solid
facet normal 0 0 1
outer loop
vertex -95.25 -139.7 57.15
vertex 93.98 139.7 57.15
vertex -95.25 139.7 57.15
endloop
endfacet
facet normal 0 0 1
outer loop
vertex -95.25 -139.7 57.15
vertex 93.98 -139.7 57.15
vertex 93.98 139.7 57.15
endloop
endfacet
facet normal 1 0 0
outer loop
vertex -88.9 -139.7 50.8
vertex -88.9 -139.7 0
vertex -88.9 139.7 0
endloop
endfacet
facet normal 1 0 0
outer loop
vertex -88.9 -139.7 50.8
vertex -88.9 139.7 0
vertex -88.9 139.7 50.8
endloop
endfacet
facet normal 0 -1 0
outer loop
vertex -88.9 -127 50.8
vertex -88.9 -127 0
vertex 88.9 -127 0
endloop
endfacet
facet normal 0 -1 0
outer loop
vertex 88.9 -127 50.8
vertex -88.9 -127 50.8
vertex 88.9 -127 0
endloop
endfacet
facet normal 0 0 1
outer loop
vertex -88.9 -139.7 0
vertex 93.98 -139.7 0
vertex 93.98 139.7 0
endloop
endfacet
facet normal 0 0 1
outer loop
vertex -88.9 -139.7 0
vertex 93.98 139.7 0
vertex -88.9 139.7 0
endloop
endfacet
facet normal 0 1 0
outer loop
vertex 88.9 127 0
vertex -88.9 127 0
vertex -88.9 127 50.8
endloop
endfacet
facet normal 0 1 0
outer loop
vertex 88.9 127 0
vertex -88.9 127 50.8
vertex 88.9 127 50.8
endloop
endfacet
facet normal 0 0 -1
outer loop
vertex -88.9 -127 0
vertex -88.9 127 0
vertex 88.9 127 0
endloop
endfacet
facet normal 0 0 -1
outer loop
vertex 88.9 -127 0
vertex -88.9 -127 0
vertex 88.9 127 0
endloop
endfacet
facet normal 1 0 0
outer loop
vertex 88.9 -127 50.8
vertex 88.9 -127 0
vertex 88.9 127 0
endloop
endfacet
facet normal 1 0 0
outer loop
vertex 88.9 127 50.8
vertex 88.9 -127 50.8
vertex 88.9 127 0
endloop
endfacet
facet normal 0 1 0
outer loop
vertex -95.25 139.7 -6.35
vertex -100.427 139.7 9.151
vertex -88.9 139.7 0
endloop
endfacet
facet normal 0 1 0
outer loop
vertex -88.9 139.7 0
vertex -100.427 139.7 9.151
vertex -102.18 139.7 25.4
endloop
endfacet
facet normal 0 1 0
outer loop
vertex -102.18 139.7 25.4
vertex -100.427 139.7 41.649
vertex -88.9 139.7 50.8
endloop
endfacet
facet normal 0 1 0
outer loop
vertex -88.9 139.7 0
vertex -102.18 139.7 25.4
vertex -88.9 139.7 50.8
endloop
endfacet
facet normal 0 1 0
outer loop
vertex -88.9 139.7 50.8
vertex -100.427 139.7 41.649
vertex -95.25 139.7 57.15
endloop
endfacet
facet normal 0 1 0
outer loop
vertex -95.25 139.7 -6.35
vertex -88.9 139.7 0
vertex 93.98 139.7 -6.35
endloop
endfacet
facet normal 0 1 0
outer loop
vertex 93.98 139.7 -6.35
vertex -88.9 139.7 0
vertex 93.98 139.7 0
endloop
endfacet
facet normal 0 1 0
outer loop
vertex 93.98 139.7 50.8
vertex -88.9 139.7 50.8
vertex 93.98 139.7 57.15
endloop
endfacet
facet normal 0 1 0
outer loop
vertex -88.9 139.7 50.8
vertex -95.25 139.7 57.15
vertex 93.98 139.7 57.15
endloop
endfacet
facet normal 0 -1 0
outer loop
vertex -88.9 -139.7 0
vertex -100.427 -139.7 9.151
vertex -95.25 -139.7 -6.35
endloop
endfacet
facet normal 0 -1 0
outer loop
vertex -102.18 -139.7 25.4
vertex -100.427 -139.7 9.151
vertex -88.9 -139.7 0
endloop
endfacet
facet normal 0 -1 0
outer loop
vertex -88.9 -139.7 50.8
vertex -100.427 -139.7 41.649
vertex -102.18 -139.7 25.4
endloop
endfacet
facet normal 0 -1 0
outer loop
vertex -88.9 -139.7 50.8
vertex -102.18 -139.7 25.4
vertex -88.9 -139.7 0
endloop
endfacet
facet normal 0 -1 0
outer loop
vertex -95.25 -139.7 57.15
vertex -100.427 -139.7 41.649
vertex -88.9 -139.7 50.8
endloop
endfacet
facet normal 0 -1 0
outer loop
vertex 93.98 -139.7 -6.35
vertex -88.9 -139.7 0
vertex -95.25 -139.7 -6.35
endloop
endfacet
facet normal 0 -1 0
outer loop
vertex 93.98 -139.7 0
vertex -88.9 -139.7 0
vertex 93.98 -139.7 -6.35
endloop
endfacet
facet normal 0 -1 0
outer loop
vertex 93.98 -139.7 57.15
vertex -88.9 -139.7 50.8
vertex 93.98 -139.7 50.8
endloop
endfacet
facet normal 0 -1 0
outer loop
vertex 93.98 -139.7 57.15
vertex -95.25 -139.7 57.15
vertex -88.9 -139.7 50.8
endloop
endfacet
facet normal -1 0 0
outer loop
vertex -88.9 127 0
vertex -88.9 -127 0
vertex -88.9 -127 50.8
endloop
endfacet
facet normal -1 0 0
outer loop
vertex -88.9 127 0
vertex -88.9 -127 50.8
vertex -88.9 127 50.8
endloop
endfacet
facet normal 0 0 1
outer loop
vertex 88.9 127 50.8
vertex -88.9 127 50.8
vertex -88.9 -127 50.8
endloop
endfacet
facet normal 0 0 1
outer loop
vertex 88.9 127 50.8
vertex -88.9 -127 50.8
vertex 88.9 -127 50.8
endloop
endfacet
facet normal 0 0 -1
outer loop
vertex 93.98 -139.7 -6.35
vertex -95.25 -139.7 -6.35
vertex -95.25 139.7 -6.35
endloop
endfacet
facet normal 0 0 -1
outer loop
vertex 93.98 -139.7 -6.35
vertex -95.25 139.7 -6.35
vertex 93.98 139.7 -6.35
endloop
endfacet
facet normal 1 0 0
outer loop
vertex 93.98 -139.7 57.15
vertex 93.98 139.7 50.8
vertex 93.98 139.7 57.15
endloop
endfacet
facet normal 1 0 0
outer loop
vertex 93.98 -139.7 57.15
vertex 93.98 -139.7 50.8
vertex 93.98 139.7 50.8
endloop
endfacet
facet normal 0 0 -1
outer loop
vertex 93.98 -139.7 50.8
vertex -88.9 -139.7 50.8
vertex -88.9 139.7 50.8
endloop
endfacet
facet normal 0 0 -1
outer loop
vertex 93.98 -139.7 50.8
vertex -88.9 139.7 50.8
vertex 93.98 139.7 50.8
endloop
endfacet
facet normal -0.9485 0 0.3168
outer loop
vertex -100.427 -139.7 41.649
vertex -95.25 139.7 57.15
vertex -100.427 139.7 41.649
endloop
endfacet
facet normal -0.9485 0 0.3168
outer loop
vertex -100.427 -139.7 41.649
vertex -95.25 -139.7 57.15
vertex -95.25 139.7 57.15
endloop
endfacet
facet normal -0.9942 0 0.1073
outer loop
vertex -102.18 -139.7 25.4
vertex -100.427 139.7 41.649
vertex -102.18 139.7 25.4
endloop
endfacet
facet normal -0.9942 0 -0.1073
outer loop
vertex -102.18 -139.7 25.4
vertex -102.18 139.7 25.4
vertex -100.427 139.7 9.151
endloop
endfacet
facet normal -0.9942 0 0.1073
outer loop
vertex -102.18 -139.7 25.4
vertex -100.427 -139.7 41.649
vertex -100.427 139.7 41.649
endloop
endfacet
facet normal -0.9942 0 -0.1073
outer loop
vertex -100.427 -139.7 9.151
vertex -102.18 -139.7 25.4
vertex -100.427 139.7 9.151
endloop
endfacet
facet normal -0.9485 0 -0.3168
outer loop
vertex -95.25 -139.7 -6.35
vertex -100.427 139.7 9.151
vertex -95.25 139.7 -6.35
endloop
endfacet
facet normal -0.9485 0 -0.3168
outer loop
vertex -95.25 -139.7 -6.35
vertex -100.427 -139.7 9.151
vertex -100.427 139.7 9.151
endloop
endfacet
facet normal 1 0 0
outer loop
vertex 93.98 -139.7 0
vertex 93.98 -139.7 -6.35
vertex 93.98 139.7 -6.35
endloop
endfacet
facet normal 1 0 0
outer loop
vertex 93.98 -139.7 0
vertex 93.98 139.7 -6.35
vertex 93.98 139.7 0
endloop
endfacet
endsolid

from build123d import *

# Parameters (mm, degrees)
F0_W     = 177.8
F0_H     = 254
F1_DEPTH = 50.8
F3_DEPTH = 139.7


with BuildPart() as f1:
    # F0 (on Top) → F1 (new body)
    with BuildSketch(Plane.XY):
        Rectangle(F0_W, F0_H)
    extrude(amount=F1_DEPTH)


with BuildPart() as f3:
    # F2 (on Front) → F3 (new body, symmetric)
    with BuildSketch(Plane.XZ):
        with BuildLine():
            Line((-95.25, -6.35), (-95.25, 57.15))
            ThreePointArc((-95.25, 57.15), (-102.179678, 25.4), (-95.25, -6.35))
        make_face()
        Polygon((88.9, 57.15), (-95.25, 57.15), (-95.25, -6.35), (88.9, -6.35), (93.98, -6.35), (93.98, 0), (88.9, 0), (-88.9, 0), (-88.9, 50.8), (88.9, 50.8), (93.98, 50.8), (93.98, 57.15), align=None)
    extrude(amount=F3_DEPTH, both=True)


solid = Compound([f1.part, f3.part])
